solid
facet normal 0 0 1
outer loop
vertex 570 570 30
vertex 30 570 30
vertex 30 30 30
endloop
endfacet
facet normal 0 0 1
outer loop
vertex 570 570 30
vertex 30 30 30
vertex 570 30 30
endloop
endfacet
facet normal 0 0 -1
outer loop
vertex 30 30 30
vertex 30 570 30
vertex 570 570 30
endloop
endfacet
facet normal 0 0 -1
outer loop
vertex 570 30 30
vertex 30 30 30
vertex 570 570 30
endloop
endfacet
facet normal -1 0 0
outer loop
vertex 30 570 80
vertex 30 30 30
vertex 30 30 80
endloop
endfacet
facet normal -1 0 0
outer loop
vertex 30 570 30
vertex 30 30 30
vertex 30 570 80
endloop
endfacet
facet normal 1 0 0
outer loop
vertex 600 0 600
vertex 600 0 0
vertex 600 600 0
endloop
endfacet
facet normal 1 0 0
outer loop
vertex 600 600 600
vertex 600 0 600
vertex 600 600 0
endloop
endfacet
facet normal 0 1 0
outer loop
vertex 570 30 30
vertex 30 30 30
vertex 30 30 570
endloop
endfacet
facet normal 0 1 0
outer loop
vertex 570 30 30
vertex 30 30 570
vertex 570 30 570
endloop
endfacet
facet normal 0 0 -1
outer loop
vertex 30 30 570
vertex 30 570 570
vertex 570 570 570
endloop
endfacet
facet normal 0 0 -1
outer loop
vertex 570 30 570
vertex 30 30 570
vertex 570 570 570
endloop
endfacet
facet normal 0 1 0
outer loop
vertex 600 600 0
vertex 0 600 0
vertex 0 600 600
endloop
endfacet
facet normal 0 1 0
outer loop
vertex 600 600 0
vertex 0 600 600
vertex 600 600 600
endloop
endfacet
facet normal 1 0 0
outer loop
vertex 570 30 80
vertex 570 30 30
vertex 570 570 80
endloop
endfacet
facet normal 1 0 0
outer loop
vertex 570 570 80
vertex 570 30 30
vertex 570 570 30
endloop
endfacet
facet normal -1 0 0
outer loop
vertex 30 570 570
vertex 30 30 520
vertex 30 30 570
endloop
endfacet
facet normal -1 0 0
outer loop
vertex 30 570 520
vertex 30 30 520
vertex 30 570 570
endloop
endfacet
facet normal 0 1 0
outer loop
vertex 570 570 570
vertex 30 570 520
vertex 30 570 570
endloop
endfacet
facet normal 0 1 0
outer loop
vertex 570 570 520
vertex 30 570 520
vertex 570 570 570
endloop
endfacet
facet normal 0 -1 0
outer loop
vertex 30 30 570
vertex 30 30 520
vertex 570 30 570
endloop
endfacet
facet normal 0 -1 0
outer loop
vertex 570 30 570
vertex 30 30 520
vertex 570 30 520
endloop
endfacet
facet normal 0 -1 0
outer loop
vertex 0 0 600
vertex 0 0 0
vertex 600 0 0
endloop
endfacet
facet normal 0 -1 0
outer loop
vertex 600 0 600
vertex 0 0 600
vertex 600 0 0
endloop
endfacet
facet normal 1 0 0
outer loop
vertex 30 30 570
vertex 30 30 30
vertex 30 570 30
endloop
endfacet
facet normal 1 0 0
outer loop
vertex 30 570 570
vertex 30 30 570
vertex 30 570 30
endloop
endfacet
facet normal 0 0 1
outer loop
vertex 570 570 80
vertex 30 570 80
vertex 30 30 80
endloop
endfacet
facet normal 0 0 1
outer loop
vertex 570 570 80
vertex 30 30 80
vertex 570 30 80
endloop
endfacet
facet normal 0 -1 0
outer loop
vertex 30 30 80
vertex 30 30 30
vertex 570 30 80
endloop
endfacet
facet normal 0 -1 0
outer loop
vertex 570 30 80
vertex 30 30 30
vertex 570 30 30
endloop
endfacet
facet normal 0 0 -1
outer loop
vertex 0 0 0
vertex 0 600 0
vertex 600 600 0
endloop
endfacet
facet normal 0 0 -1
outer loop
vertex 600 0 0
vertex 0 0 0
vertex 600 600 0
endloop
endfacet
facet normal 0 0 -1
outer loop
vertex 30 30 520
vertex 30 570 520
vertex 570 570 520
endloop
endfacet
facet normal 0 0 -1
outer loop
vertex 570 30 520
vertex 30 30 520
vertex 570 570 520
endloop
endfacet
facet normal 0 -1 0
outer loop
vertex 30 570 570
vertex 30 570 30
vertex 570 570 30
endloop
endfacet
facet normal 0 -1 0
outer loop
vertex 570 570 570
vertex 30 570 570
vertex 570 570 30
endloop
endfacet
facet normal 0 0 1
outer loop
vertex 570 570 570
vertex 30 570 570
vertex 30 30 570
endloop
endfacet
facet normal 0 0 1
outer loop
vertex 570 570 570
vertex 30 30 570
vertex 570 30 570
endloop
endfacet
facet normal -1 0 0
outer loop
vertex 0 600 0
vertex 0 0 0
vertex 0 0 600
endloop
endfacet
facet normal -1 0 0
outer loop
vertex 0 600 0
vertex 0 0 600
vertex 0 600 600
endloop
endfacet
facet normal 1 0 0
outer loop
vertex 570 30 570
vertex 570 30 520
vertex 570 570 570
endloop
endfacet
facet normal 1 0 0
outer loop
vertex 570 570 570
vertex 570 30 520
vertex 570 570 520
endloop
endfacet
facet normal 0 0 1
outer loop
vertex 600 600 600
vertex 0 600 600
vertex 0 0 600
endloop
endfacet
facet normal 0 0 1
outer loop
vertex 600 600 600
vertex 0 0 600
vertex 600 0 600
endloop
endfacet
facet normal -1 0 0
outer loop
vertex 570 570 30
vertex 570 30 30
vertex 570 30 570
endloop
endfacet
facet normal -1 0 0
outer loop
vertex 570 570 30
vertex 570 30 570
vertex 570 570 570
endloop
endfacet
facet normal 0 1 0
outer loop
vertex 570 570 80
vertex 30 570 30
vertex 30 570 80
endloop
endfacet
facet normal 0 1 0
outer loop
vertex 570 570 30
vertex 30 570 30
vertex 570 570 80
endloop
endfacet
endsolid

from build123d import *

# Parameters (mm, degrees)
BOX001_W     = 540
BOX001_H     = 540
BOX001_DEPTH = 540
BOX_W        = 600
BOX_H        = 600
BOX_DEPTH    = 600
BOX002_W     = 540
BOX002_H     = 540
BOX002_DEPTH = 50
BOX003_W     = 540
BOX003_H     = 540
BOX003_DEPTH = 50


with BuildPart() as loch:
    # Box001 → Box001 (new body)
    with BuildSketch(Plane(origin=(30, 30, 30), x_dir=(1, 0, 0), z_dir=(0, 0, 1))):
        with Locations((270, 270)):
            Rectangle(BOX001_W, BOX001_H)
    extrude(amount=BOX001_DEPTH)


with BuildPart() as cut:
    # Box → Box (new body)
    with BuildSketch(Plane.XY):
        with Locations((300, 300)):
            Rectangle(BOX_W, BOX_H)
    extrude(amount=BOX_DEPTH)

    # Cut: cut Loch
    add(loch.part, mode=Mode.SUBTRACT)


with BuildPart() as akku_bot:
    # Box002 → Box002 (new body)
    with BuildSketch(Plane(origin=(30, 30, 30), x_dir=(1, 0, 0), z_dir=(0, 0, 1))):
        with Locations((270, 270)):
            Rectangle(BOX002_W, BOX002_H)
    extrude(amount=BOX002_DEPTH)


with BuildPart() as akku_top:
    # Box003 → Box003 (new body)
    with BuildSketch(Plane(origin=(30, 30, 520), x_dir=(1, 0, 0), z_dir=(0, 0, 1))):
        with Locations((270, 270)):
            Rectangle(BOX003_W, BOX003_H)
    extrude(amount=BOX003_DEPTH)


solid = Compound([cut.part, akku_bot.part, akku_top.part])
